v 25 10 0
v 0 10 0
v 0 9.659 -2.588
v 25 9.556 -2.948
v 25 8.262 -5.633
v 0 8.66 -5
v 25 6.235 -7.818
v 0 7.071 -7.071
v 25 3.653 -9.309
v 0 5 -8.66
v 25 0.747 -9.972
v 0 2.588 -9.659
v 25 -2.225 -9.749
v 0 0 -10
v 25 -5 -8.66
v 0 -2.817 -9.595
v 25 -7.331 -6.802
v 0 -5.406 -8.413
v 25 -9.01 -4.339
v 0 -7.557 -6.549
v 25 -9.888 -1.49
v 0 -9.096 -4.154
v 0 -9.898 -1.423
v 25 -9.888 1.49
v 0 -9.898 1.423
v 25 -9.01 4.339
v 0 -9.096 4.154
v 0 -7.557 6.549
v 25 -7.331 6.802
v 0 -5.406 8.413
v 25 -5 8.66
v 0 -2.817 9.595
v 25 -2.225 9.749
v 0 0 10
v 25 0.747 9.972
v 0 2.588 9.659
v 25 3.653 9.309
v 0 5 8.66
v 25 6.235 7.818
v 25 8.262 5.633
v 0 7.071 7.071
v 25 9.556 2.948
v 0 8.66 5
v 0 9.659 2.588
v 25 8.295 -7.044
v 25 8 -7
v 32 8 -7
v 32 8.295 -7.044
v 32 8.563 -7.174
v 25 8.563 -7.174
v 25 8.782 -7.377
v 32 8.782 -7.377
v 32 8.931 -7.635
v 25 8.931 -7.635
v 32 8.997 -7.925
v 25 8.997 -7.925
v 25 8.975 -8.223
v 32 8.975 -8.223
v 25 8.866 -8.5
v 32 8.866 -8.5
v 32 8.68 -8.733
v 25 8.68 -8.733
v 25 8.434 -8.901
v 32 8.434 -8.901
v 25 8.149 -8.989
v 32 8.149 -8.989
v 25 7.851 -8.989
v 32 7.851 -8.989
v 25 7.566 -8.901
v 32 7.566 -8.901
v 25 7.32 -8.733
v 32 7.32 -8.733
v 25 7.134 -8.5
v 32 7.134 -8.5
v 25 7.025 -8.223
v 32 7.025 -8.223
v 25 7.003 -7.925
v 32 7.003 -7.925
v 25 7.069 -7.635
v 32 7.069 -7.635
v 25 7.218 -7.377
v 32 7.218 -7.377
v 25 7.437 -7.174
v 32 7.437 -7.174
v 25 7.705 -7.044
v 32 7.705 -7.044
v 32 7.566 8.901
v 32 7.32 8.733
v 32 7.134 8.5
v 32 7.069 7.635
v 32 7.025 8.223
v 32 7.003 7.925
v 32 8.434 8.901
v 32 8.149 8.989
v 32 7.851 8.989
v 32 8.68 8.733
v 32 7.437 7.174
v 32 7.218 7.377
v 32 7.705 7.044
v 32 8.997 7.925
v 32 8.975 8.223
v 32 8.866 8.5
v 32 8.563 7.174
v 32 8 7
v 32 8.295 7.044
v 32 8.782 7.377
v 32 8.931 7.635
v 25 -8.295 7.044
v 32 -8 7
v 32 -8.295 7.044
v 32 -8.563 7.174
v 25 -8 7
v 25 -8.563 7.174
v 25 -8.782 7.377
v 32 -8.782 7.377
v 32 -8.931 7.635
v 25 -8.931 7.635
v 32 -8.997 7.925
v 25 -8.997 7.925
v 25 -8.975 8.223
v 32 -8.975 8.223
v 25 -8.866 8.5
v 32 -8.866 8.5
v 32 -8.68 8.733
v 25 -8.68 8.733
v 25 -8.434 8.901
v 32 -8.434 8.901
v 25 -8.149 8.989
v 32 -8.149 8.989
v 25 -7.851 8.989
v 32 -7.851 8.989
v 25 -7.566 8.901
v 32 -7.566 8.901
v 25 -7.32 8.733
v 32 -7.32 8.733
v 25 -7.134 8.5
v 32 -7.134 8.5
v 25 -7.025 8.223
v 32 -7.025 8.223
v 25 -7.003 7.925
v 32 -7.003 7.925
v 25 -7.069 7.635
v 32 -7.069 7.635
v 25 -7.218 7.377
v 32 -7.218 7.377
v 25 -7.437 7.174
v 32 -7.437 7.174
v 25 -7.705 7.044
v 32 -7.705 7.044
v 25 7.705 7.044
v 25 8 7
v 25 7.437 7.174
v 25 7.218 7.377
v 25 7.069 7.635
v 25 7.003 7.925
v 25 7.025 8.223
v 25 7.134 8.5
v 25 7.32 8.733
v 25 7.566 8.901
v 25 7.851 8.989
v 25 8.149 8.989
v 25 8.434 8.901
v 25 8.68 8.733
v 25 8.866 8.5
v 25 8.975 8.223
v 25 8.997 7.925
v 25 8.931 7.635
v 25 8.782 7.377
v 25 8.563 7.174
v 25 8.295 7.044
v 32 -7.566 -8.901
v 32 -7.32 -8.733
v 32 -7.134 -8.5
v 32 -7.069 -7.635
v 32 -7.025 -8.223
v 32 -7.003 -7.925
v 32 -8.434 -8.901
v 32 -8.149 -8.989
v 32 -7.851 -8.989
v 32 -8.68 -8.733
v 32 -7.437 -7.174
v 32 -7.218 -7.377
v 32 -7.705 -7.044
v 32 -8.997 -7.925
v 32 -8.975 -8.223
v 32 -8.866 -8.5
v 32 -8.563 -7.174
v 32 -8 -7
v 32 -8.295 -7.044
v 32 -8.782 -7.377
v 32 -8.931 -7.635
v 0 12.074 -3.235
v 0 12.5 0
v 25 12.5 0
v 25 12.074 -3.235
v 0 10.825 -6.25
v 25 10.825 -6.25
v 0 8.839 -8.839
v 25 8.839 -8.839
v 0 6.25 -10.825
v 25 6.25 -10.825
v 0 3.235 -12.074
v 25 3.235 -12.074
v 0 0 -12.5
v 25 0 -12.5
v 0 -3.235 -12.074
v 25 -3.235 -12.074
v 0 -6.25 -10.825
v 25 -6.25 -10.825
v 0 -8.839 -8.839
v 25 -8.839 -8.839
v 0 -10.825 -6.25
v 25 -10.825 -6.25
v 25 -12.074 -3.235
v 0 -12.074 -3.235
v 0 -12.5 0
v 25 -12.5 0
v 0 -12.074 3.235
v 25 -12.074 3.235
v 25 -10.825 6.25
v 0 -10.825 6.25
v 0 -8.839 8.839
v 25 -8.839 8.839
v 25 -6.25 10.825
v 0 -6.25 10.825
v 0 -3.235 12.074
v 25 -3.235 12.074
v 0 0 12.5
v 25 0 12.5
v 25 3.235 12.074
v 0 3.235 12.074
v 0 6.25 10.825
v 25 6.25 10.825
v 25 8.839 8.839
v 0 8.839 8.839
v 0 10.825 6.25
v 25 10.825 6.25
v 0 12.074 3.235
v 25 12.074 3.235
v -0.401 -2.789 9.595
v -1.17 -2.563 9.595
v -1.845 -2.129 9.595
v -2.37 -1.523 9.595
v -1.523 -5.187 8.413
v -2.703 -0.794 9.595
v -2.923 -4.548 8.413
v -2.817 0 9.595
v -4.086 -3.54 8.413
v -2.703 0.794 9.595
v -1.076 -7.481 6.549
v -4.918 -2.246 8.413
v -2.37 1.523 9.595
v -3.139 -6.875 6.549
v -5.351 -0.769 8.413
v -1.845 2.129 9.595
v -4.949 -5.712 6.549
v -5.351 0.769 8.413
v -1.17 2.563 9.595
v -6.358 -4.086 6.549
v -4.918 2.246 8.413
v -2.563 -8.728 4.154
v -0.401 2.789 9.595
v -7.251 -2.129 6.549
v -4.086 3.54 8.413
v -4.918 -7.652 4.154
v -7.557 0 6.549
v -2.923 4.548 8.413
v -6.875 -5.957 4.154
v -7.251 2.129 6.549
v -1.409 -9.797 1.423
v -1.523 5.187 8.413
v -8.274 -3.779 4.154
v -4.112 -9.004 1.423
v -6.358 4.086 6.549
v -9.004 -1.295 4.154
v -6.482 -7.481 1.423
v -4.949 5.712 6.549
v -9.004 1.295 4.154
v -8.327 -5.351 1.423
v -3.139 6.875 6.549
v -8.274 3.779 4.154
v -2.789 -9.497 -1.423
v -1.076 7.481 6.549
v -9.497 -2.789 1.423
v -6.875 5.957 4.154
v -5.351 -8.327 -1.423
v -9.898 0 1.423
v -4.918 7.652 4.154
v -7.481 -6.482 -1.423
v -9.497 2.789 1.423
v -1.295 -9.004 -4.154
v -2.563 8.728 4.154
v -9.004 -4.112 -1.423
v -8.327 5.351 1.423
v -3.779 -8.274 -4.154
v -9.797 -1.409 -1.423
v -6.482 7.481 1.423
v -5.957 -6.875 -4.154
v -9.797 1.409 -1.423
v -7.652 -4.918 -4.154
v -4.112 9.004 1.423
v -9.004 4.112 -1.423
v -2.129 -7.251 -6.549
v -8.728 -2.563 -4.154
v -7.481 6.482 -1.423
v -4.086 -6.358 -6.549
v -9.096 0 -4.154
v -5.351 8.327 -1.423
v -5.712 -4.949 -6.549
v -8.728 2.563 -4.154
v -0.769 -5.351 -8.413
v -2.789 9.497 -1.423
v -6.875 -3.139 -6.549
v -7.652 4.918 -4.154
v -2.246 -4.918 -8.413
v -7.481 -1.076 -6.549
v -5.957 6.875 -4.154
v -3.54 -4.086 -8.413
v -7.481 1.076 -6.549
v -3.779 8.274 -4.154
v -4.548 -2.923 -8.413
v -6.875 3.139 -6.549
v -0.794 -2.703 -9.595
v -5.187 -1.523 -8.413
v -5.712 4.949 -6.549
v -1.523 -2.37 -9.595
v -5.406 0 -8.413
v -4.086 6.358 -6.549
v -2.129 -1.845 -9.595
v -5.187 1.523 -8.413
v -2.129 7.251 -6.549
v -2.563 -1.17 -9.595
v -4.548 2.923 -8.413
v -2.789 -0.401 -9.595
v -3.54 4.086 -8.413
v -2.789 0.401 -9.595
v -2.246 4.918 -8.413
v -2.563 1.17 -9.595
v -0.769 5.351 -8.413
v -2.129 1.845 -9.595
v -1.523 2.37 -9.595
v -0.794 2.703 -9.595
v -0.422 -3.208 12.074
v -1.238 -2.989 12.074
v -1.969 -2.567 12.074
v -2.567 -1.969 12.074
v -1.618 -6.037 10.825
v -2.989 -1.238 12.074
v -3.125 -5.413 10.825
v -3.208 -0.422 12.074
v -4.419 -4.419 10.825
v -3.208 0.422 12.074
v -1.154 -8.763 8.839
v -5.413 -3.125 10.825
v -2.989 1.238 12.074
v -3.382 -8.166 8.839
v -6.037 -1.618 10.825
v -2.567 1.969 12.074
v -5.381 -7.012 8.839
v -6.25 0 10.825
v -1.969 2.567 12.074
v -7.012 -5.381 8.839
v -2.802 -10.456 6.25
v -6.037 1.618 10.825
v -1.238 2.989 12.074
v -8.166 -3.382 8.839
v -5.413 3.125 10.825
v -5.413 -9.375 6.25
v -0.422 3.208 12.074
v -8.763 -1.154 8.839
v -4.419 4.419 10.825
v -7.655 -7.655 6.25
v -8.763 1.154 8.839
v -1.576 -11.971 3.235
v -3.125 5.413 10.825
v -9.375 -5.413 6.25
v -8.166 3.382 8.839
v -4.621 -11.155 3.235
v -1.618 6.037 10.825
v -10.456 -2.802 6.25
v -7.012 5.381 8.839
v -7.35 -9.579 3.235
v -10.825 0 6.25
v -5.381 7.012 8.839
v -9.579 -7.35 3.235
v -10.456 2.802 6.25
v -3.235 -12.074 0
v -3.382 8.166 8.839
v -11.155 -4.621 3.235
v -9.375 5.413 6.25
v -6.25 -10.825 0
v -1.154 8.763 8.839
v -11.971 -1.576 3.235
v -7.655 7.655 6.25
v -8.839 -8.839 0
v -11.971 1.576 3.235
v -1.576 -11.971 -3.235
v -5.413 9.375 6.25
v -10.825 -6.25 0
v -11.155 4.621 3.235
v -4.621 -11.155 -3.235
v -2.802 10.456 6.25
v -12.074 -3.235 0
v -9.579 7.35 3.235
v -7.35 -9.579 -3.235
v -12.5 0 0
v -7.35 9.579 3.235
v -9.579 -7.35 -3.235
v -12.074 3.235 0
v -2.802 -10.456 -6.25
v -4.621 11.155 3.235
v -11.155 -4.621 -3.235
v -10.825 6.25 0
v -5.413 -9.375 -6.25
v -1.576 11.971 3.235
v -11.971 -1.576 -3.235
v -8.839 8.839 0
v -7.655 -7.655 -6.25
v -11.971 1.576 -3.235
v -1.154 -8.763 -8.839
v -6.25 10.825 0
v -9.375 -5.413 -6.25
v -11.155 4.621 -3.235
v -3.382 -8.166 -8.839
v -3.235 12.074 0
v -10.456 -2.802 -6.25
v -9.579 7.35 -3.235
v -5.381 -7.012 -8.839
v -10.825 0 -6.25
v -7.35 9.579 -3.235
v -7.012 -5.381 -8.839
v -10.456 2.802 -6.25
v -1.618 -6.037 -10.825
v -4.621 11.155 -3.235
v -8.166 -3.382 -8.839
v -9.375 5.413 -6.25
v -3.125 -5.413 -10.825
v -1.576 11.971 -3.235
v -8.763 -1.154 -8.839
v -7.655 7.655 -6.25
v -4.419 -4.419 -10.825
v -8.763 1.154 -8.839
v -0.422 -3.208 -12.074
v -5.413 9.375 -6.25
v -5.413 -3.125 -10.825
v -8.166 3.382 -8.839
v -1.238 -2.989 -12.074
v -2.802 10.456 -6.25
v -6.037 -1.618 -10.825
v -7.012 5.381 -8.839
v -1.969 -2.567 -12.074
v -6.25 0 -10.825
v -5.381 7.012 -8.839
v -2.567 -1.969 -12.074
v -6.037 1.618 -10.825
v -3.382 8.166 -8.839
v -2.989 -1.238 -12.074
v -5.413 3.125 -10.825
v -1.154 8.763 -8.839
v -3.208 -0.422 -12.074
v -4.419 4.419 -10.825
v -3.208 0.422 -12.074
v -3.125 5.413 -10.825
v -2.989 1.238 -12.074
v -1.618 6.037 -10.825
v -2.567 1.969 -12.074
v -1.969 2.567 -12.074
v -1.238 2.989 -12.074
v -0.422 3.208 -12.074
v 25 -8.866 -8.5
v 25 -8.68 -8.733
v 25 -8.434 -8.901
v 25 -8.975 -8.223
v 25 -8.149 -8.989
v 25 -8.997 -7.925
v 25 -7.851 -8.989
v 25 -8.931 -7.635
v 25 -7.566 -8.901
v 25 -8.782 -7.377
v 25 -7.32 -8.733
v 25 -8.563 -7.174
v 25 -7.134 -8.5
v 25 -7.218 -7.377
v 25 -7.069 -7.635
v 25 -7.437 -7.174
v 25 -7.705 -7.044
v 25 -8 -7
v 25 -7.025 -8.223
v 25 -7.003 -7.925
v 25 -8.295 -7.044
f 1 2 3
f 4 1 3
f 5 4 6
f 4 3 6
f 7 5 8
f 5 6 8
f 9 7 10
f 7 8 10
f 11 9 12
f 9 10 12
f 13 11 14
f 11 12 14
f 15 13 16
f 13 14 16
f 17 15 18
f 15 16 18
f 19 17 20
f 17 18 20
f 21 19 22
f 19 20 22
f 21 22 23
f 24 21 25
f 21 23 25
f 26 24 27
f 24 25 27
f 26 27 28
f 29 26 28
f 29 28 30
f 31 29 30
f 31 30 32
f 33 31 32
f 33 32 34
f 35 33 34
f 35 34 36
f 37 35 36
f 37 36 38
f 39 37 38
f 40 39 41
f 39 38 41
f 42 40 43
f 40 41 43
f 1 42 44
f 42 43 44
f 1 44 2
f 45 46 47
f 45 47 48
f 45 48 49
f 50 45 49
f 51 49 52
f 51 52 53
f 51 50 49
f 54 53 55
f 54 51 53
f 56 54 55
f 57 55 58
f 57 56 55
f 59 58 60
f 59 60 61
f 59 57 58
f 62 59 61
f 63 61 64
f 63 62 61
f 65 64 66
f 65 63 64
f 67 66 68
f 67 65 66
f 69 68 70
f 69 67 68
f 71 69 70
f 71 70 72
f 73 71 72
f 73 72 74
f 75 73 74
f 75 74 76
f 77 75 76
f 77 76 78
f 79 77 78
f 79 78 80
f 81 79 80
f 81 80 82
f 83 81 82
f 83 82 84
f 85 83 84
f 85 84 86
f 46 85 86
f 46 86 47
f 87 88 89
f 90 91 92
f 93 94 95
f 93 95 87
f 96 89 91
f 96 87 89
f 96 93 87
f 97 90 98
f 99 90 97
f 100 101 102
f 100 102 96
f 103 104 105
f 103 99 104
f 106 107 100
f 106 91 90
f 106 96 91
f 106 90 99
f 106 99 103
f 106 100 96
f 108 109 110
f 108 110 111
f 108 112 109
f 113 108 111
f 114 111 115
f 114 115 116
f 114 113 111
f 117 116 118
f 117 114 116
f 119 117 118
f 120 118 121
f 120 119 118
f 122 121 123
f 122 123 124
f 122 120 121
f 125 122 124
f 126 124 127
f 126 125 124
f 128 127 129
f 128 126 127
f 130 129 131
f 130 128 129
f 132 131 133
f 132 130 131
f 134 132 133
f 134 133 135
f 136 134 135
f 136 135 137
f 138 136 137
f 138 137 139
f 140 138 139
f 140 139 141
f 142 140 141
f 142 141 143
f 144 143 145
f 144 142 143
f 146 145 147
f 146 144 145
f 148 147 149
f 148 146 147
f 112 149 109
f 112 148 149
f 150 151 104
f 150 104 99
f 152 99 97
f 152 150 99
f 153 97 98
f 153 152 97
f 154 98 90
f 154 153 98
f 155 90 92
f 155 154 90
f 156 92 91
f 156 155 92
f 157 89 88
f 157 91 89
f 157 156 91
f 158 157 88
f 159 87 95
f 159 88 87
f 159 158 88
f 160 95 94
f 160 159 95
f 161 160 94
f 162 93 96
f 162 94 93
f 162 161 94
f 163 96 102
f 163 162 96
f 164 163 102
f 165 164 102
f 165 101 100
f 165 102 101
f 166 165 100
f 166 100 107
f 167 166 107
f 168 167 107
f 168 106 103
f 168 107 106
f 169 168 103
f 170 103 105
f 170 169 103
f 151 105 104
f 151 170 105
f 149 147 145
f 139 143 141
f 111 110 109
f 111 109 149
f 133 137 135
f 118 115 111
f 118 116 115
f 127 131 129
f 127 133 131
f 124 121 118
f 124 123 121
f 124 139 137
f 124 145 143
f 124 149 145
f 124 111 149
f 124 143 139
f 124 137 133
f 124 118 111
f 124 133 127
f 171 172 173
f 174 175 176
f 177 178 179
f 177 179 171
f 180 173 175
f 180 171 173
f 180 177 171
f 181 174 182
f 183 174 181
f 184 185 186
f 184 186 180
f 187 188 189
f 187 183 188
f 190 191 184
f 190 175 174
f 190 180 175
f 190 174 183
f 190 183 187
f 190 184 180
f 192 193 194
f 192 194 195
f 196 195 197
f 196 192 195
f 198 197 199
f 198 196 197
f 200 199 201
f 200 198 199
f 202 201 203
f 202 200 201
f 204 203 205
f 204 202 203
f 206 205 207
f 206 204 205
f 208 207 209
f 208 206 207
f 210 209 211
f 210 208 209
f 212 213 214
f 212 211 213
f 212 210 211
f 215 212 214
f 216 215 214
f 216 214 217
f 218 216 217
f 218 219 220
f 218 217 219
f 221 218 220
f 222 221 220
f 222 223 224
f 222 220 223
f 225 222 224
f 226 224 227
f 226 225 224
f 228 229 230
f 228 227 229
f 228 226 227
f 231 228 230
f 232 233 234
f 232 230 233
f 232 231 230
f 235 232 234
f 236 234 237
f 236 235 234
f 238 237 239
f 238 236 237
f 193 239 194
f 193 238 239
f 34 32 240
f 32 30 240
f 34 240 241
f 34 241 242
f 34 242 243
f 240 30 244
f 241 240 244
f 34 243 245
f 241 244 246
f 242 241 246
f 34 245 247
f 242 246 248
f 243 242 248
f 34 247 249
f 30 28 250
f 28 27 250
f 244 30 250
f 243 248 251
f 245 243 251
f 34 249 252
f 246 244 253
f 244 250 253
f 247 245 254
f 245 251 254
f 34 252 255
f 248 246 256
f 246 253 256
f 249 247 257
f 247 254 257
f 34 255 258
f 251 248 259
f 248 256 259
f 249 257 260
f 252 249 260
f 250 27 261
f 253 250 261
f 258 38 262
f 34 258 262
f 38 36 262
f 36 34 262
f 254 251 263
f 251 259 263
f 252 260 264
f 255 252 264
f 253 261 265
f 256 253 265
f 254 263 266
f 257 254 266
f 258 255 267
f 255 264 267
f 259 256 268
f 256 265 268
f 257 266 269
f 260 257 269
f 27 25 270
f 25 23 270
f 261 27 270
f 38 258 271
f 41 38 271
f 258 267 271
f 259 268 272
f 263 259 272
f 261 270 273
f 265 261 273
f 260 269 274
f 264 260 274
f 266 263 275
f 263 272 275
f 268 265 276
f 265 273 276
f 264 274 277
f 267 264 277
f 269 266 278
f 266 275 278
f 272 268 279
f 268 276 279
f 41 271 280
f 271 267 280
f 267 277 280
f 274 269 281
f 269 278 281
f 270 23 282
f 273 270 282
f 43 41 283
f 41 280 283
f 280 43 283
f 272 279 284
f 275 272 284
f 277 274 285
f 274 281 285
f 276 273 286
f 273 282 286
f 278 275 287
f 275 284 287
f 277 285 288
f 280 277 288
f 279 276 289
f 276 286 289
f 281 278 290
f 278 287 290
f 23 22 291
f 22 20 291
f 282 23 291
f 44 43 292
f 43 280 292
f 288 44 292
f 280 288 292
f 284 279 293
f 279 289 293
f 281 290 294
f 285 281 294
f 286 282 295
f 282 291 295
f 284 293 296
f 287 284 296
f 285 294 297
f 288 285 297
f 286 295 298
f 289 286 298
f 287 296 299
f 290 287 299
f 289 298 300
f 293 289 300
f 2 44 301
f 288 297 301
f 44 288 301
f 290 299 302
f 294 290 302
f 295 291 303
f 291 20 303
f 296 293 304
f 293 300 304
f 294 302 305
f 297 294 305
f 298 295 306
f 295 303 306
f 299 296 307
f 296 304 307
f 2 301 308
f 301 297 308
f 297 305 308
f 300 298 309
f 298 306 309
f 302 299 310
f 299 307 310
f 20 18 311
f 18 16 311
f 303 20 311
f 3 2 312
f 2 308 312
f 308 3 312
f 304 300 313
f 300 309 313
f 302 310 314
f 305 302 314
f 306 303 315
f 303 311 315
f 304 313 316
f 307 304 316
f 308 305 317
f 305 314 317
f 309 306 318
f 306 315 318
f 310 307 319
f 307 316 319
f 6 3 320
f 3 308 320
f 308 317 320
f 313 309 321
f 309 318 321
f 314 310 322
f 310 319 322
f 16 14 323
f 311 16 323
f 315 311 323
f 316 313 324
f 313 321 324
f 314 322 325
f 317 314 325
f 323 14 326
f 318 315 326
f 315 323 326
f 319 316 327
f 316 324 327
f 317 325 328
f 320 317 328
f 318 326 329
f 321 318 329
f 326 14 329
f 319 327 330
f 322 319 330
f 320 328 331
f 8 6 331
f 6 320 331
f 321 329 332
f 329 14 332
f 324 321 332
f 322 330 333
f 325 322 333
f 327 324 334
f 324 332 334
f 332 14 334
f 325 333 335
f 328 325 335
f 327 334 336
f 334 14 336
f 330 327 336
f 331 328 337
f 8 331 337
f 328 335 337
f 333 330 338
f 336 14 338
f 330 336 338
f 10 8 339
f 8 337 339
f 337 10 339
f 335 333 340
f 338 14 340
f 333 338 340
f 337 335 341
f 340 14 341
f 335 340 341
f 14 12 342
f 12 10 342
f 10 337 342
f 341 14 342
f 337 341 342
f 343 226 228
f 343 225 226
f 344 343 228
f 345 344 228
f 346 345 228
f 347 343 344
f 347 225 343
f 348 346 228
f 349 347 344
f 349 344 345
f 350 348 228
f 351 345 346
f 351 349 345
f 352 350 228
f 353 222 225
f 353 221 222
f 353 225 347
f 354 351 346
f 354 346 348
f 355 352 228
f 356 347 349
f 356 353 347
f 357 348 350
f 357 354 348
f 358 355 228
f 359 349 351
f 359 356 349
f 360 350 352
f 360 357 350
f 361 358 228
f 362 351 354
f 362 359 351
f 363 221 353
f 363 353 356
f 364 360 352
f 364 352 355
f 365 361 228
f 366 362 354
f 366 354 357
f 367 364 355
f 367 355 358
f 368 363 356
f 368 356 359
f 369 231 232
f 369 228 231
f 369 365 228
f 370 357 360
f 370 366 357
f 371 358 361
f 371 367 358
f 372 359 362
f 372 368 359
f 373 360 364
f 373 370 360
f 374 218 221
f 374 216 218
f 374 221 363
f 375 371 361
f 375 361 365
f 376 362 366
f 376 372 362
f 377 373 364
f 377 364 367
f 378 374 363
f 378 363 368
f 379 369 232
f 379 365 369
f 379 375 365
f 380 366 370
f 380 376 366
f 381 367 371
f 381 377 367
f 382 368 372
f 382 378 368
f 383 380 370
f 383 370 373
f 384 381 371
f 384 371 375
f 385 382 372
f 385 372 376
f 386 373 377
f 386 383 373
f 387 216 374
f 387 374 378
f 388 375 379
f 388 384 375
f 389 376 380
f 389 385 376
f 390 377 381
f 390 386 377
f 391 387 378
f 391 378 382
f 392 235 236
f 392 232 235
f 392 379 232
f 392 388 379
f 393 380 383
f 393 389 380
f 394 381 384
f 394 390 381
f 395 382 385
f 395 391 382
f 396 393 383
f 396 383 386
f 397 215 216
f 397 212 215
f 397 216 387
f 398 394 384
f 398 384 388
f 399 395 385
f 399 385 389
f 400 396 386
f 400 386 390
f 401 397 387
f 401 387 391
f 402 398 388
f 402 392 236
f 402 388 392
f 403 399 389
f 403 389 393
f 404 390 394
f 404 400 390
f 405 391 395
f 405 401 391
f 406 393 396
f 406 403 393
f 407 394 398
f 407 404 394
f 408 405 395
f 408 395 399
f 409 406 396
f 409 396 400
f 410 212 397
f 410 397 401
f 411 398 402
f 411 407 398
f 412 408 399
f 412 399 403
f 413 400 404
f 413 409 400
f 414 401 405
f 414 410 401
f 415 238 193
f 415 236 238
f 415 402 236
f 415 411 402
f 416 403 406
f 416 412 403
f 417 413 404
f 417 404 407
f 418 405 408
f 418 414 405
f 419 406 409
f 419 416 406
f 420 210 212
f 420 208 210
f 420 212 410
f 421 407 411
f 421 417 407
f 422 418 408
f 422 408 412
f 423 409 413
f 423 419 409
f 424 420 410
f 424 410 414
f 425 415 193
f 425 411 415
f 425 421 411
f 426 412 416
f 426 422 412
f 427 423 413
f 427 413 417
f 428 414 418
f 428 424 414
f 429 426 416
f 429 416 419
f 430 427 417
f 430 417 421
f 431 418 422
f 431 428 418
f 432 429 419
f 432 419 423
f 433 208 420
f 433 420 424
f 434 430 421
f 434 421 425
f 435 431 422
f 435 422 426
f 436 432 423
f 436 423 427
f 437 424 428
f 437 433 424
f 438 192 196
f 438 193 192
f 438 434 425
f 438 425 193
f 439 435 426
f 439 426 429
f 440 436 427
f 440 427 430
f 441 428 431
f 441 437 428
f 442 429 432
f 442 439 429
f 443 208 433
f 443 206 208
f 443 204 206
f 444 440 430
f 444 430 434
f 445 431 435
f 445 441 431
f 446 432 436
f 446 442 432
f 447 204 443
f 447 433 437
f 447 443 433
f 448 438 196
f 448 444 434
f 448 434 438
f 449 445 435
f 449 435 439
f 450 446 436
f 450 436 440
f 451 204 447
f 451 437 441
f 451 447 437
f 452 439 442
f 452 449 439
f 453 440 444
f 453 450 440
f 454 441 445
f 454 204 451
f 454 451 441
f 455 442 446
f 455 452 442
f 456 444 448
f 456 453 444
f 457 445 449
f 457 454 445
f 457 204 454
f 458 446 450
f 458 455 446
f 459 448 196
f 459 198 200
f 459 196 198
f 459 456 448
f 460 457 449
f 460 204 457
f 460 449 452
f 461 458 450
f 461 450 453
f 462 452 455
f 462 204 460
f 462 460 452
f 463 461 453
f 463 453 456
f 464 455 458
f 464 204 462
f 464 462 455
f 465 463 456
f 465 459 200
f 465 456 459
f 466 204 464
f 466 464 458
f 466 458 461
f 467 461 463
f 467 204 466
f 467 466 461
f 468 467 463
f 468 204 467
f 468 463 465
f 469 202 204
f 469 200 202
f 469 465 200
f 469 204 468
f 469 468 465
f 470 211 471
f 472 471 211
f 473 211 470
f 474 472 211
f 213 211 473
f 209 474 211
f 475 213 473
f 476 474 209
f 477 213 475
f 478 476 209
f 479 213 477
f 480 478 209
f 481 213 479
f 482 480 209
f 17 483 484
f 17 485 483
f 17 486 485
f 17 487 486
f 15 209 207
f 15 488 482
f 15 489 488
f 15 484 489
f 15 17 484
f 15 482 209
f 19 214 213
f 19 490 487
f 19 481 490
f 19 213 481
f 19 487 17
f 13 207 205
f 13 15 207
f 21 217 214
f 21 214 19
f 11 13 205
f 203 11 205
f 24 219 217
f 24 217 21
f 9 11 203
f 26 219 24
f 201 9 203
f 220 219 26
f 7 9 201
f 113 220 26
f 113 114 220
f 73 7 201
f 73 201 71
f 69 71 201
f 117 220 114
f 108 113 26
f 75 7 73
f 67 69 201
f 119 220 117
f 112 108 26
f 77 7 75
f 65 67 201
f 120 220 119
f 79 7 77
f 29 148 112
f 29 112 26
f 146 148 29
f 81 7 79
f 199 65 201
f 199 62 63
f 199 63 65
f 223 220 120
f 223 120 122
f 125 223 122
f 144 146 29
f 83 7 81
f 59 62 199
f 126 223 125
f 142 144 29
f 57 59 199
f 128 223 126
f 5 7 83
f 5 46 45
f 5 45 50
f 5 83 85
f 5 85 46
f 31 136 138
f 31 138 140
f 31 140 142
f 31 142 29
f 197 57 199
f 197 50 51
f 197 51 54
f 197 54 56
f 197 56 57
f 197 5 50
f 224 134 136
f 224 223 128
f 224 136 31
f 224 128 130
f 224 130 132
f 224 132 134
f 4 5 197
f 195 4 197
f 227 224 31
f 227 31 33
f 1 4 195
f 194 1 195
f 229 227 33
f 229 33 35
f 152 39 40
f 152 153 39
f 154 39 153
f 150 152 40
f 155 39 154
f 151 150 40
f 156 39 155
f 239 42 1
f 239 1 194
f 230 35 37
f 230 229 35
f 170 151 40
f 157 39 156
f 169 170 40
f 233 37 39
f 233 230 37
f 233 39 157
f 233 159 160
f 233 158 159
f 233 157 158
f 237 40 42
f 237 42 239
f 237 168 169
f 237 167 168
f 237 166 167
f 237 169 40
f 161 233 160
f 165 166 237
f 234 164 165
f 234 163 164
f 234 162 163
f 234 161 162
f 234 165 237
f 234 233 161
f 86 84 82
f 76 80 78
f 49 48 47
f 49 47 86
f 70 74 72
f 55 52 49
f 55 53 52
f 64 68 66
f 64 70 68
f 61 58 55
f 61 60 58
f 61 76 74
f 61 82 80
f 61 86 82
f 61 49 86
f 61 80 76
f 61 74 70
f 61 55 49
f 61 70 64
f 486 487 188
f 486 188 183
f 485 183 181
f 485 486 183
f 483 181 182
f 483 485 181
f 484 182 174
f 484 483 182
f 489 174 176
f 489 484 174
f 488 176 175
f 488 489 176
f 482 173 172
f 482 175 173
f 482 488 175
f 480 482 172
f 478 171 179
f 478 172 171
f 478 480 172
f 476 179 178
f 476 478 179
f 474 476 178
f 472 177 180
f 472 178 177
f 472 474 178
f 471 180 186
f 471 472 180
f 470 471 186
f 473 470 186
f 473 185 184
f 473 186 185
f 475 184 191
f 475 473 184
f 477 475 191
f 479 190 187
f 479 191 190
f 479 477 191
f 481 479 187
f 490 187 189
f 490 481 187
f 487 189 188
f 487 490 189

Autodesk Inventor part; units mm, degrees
ref_plane "YZ Plane" through (0, 0, 0) normal (1, 0, 0) x (0, 1, 0)
ref_plane "XZ Plane" through (0, 0, 0) normal (0, 1, 0) x (-1, 0, 0)
ref_plane "XY Plane" through (0, 0, 0) normal (0, 0, 1) x (1, 0, 0)
sketch "Sketch2" plane through (0, 0, 0) normal (1, 0, 0) x (0, 1, 0)
  circle A0 centre (0, 0) radius 10
  circle A1 centre (0, 0) radius 12.5
  dimension "d3" = 20
  dimension "d4" = 25
extrude "Extrusion1" add sketch "Sketch2" along normal blind 25
sketch "Sketch3" plane through (0, 0, 0) normal (-1, 0, 0) x (0, 0, 1)
  circle A0 centre (0, 0) radius 10 projected
  arc A1 (10, 0) -> (-10, 0) centre (0, 0) ccw
  circle A2 centre (0, 0) radius 12.5 projected
  arc A3 (12.5, 0) -> (-12.5, 0) centre (0, 0) ccw
  line L0 (-12.5, 0) -> (-10, 0)
  line L1 (10, 0) -> (12.5, 0)
revolve "Revolution1" add sketch "Sketch3" angle 180 about axis through (0, 0, 10) along (0, 0, 1) picked at (-11.4487, 1.7949) contours A0 L0 A2 L1
sketch "Sketch5" plane through (25, 0, 0) normal (1, 0, 0) x (0, 0, -1)
  circle A0 centre (-8, 8) radius 1
  point P0 (0, 0)
  dimension "d9" = 2
extrude "Extrusion2" add sketch "Sketch5" along normal blind 7
mirror "Mirror1" about plane through (0, 0, 0) normal (0, 0, 1) of "Extrusion2"
mirror "Mirror2" about plane through (0, 0, 0) normal (0, 1, 0) of "Extrusion2", "Mirror1"
properties part number "Plasmid Half 1"
